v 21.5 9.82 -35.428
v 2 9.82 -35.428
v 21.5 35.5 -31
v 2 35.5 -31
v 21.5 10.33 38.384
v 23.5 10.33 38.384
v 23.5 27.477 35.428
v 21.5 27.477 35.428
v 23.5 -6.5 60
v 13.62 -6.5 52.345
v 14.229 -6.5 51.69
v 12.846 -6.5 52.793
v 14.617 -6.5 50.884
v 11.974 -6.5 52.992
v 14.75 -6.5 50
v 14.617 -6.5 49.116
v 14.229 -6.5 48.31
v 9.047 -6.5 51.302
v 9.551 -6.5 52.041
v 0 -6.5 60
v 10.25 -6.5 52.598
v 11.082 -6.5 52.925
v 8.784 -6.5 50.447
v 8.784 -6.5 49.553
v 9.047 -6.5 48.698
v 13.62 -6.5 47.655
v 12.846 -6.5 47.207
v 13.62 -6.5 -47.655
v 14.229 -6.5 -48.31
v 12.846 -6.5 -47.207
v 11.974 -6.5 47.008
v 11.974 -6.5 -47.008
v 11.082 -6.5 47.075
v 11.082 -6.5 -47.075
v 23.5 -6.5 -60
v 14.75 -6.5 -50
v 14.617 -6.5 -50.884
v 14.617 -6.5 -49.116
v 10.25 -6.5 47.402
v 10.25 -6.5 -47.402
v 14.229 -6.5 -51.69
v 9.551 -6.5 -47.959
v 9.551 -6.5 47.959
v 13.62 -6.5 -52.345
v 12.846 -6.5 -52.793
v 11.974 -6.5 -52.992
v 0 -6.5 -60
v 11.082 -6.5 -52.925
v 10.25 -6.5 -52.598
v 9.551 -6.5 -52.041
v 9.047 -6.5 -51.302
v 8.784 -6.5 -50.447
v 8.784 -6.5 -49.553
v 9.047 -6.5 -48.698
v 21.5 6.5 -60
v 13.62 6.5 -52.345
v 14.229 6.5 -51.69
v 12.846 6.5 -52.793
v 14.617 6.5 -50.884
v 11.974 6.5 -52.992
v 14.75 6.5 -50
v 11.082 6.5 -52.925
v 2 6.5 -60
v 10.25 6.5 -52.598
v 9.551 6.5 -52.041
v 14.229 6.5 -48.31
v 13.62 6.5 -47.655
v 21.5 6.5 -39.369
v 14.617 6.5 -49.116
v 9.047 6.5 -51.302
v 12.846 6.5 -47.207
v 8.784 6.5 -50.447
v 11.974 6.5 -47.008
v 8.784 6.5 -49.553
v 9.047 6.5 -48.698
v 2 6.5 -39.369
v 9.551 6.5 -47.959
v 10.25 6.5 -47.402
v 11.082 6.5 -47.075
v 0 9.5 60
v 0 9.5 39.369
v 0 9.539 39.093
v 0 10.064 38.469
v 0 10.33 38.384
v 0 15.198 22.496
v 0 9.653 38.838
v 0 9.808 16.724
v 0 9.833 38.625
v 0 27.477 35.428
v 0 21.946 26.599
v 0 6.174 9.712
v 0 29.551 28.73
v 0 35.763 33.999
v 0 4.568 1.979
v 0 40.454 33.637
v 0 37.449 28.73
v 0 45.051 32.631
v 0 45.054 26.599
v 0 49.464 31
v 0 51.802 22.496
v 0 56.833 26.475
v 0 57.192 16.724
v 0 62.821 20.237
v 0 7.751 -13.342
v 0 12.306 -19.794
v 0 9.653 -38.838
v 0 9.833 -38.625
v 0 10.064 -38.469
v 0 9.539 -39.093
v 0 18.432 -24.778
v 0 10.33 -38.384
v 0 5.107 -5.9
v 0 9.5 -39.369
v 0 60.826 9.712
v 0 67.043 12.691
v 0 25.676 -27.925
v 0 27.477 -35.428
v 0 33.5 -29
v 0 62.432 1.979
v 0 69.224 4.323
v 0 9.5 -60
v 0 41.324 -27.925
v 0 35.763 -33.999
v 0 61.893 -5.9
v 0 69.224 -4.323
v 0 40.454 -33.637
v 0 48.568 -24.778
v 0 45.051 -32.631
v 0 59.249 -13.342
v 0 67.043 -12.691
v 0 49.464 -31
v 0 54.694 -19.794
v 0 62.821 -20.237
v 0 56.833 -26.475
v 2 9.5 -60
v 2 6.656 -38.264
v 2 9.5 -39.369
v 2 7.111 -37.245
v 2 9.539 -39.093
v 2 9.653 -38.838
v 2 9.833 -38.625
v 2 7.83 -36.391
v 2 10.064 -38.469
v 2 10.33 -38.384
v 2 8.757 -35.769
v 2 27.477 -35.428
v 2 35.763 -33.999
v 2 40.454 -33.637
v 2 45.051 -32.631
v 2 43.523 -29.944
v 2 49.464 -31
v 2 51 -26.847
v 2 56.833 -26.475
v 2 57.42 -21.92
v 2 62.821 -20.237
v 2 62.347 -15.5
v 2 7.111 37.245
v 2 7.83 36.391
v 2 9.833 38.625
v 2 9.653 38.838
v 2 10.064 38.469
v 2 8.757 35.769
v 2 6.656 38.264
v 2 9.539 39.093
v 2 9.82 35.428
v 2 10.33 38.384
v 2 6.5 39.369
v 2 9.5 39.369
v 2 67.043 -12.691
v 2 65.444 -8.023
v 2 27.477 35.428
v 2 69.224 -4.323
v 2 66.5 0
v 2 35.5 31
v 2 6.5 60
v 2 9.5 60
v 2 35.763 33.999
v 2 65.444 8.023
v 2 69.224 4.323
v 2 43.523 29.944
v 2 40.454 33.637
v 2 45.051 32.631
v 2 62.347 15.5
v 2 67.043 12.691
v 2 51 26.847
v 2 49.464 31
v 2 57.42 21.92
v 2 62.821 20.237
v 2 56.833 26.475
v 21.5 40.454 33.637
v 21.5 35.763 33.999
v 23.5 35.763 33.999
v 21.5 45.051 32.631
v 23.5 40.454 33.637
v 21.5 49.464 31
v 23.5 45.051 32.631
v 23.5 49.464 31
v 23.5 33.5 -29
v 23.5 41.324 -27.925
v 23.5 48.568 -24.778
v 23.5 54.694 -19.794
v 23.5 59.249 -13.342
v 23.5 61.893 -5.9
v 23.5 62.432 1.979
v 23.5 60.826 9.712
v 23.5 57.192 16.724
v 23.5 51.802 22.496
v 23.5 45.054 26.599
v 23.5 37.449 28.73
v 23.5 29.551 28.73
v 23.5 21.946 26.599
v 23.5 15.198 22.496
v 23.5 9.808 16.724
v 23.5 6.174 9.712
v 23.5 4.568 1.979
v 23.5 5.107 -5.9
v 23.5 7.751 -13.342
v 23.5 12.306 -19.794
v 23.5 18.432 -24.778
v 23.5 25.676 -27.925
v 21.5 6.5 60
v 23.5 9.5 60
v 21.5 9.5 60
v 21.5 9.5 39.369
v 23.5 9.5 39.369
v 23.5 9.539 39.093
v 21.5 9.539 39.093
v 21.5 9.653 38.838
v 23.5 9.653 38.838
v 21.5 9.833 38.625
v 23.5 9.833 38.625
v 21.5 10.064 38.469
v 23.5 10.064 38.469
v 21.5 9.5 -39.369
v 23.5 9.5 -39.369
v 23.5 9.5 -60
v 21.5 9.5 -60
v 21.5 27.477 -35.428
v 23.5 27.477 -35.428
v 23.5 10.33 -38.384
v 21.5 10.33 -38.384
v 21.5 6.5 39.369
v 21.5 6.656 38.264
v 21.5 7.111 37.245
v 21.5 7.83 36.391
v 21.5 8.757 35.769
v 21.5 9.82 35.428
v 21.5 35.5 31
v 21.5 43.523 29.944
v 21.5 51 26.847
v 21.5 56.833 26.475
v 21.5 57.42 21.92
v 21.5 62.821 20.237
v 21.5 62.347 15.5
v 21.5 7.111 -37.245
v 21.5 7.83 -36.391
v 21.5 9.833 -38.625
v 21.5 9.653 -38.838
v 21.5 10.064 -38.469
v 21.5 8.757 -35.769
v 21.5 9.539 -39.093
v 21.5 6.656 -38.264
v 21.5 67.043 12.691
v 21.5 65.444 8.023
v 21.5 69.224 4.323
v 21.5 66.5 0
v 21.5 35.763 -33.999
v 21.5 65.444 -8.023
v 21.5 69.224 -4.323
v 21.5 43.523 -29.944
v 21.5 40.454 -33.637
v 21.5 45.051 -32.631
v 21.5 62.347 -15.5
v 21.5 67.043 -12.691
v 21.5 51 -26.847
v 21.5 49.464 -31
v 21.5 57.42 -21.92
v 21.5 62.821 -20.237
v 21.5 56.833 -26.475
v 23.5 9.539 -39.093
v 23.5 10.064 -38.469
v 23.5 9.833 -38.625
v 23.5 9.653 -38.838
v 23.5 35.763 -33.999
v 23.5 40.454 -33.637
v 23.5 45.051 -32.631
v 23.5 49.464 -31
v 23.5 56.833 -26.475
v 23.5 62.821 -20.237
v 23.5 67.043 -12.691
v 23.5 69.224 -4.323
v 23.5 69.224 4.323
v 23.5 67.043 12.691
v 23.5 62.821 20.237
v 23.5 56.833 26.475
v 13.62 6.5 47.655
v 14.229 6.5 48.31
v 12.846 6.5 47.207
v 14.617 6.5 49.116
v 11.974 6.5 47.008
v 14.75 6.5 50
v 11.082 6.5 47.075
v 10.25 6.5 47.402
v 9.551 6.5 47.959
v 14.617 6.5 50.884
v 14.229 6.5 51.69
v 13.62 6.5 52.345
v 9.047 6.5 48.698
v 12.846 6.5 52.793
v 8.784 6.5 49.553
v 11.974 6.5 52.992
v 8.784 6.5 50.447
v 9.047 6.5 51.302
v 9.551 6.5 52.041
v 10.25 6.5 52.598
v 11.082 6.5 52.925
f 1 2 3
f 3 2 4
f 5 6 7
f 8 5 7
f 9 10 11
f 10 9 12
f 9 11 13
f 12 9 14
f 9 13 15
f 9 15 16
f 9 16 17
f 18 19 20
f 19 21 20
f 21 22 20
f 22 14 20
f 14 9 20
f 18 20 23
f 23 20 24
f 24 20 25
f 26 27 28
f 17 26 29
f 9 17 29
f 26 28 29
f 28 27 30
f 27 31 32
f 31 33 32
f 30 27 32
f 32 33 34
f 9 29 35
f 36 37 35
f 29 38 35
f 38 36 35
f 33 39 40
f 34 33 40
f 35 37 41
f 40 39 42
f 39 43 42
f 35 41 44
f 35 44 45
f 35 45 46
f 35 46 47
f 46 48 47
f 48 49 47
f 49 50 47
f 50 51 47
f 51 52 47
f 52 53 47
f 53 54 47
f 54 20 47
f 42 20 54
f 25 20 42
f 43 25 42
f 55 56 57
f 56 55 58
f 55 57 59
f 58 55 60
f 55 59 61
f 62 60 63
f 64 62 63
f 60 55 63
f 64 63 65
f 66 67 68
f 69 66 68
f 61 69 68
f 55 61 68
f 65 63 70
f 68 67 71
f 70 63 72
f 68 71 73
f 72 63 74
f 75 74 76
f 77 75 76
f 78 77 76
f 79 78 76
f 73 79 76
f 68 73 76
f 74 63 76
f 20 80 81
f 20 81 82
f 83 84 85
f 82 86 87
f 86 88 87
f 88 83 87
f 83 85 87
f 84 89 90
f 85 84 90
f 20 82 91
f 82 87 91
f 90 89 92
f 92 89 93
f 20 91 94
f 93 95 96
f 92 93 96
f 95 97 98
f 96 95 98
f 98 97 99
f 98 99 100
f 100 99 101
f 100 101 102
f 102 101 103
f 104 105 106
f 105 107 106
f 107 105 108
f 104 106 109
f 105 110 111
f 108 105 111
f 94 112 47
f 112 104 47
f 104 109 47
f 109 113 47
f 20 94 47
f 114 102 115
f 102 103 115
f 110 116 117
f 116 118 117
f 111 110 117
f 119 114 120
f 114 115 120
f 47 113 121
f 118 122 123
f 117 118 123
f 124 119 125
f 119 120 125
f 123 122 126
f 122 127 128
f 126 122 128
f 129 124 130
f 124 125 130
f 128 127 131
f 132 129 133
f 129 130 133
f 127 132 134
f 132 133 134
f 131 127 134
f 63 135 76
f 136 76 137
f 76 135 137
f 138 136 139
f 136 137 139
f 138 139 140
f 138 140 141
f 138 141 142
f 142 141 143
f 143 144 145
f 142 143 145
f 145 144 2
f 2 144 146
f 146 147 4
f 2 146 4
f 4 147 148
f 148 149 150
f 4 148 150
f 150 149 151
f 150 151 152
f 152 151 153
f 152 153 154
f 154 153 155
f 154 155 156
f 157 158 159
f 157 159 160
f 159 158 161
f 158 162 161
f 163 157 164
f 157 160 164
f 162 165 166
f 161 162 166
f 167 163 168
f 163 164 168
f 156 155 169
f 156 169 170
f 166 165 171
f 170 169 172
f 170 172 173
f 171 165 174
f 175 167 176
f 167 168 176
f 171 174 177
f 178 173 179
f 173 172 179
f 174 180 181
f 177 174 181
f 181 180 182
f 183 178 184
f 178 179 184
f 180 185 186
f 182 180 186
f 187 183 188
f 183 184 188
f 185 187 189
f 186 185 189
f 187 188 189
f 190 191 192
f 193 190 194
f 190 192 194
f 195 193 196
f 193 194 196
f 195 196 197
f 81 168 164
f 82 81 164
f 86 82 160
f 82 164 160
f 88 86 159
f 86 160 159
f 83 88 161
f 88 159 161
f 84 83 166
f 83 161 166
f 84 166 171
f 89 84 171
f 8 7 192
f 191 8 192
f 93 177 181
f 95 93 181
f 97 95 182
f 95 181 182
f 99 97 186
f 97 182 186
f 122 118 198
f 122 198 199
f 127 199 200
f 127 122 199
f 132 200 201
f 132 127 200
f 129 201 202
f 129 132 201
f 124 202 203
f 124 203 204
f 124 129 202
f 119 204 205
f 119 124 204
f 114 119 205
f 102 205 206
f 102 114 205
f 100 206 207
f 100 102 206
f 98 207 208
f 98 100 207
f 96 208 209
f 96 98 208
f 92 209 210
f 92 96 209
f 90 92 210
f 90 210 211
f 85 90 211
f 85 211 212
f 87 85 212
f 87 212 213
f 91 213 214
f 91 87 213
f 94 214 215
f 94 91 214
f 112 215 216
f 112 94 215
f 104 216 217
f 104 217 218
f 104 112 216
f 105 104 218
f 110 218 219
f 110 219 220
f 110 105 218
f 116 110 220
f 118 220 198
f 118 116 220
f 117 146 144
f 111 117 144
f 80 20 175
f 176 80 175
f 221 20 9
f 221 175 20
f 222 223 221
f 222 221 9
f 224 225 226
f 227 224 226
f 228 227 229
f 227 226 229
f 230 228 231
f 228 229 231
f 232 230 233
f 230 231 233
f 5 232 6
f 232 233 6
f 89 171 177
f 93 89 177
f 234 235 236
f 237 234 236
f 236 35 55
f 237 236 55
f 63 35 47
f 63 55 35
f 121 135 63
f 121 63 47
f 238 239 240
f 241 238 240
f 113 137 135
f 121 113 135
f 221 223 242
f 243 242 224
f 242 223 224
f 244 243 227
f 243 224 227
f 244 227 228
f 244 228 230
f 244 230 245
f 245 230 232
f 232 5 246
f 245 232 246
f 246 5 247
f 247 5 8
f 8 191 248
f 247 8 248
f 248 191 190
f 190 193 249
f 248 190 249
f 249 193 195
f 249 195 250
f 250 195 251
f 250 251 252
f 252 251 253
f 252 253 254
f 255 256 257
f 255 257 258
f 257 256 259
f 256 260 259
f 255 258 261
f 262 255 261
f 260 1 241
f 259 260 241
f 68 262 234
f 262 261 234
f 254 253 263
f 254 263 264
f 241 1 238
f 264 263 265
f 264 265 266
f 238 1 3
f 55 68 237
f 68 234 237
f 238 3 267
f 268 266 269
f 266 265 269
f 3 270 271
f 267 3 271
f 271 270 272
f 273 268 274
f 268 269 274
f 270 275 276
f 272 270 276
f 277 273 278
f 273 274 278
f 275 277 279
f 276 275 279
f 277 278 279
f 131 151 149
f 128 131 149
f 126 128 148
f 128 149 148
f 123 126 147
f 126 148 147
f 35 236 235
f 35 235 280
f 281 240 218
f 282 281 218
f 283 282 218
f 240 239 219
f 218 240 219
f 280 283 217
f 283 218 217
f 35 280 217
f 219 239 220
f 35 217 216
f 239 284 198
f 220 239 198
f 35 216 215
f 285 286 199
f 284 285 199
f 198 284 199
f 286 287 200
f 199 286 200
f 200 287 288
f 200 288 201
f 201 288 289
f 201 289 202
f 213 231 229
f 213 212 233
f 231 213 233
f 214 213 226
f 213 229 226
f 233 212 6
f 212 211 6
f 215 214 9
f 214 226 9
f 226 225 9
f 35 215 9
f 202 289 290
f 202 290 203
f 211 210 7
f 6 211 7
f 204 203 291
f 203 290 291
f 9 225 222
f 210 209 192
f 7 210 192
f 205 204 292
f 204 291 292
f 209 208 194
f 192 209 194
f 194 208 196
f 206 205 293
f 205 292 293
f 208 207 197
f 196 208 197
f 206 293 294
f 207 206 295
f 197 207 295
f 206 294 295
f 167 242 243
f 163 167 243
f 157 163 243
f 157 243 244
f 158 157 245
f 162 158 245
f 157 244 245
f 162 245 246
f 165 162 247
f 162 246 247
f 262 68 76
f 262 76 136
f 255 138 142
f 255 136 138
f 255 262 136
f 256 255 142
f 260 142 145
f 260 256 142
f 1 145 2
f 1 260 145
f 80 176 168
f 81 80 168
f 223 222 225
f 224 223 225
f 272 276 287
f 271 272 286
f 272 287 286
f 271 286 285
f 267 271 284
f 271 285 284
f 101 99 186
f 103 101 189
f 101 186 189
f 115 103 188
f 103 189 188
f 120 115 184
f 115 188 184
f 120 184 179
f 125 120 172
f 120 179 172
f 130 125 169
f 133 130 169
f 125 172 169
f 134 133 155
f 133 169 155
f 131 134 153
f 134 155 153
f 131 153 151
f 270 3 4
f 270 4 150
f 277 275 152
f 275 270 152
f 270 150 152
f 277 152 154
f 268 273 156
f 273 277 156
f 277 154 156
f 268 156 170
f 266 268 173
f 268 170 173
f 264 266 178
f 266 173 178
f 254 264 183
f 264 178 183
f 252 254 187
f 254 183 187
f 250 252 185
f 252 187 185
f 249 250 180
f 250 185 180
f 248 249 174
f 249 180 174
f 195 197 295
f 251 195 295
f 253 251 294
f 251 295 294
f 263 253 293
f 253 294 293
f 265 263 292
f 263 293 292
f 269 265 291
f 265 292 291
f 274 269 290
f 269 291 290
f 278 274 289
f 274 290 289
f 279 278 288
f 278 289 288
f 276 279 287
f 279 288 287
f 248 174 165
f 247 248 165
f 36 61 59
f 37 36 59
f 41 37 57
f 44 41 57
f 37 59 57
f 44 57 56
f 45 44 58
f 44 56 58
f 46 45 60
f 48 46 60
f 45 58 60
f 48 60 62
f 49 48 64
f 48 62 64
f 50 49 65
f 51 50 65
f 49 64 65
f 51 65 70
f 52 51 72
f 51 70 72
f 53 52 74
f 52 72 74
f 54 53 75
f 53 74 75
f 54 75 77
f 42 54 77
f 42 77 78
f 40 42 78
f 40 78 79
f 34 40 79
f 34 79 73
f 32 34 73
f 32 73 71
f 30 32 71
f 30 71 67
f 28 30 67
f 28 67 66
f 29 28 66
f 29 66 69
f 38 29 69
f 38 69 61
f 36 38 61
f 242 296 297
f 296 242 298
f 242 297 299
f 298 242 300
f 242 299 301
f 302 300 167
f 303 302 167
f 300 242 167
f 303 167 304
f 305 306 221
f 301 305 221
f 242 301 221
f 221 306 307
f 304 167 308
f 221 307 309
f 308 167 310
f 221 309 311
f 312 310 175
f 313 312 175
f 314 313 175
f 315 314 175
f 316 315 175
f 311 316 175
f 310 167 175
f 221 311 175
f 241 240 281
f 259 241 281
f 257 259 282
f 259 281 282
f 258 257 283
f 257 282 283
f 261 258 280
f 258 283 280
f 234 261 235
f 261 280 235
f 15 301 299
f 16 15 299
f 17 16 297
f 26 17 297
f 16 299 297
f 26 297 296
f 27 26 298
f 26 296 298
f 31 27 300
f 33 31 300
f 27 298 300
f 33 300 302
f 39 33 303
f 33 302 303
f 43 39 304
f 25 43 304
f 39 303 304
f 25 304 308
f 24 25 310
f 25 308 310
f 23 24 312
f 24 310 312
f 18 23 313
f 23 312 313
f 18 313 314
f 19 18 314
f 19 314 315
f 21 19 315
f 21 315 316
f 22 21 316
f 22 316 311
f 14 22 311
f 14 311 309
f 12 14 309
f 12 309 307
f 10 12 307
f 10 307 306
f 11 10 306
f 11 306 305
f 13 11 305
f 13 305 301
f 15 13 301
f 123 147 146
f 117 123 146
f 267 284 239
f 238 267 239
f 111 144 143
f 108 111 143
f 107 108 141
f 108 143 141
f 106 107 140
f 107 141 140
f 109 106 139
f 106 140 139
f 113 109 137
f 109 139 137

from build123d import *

# Parameters (mm, degrees)
SZKIC2_R                    = 29
DODANIE_WYCI_GNI_CIE2_DEPTH = 23.5
SZKIC3_R                    = 3
WYTNIJ_WYCI_GNI_CIE1_DEPTH  = 23.5
ZAOKR_GLENIE1_R             = 4
DODANIE_WYCI_GNI_CIE3_REACH = 82
WYTNIJ_WYCI_GNI_CIE2_DEPTH  = 23.5


with BuildPart() as part:
    # Szkic2 → Dodanie-wyciągnięcie2 (new body)
    with BuildSketch(Plane(origin=(0, 0, 0), x_dir=(0, 0, -1), z_dir=(1, 0, 0))):
        with BuildLine():
            Line((-60, -6.5), (60, -6.5))
            Line((60, -6.5), (60, 6.5))
            Line((60, 6.5), (36, 6.5))
            Line((36, 6.5), (31, 35.5))
            ThreePointArc((31, 35.5), (0, 66.5), (-31, 35.5))
            Line((-31, 35.5), (-36, 6.5))
            Line((-36, 6.5), (-60, 6.5))
            Line((-60, 6.5), (-60, -6.5))
        make_face()
        with Locations((0, 33.5)):
            Circle(SZKIC2_R, mode=Mode.SUBTRACT)
    extrude(amount=DODANIE_WYCI_GNI_CIE2_DEPTH)

    # Szkic3 → Wytnij-wyciągnięcie1 (cut)
    with BuildSketch(Plane(origin=(0, 6.5, 0), x_dir=(1, 0, 0), z_dir=(0, 1, 0))):
        with Locations((11.75, 50)):
            Circle(SZKIC3_R)
        with Locations((11.75, -50)):
            Circle(SZKIC3_R)
    extrude(amount=-WYTNIJ_WYCI_GNI_CIE1_DEPTH, mode=Mode.SUBTRACT)

    # Zaokrąglenie1
    zaokr_glenie1_edges = [part.edges().sort_by_distance(p)[0] for p in [
        (11.75, 6.5, -36),
        (11.75, 6.5, 36),
    ]]
    fillet(zaokr_glenie1_edges, radius=ZAOKR_GLENIE1_R)

    # Szkic4 → Dodanie-wyciągnięcie3 (add, up to next)
    with BuildSketch(Plane(origin=(0, 73.5, 0), x_dir=(-1, 0, 0), z_dir=(0, -1, 0)), mode=Mode.PRIVATE) as dodanie_wyci_gni_cie3_sk1:
        Polygon((0, 60), (0, 39.369362474), (0, 35.427522011), (0, 31), (0, -31), (0, -35.427522011), (0, -39.369362474), (0, -60), (-2, -60), (-2, -58), (-2, 58), (-2, 60), align=None)
    dodanie_wyci_gni_cie3_tool1 = extrude(dodanie_wyci_gni_cie3_sk1.sketch, amount=DODANIE_WYCI_GNI_CIE3_REACH, mode=Mode.PRIVATE) - part.part
    add(dodanie_wyci_gni_cie3_tool1.solids().sort_by_distance((1, 73.5, 0))[0])
    # Szkic4 → Dodanie-wyciągnięcie3 (add, up to next)
    with BuildSketch(Plane(origin=(0, 73.5, 0), x_dir=(-1, 0, 0), z_dir=(0, -1, 0)), mode=Mode.PRIVATE) as dodanie_wyci_gni_cie3_sk2:
        Polygon((-23.5, 39.369362474), (-23.5, 60), (-21.5, 60), (-21.5, 58), (-21.5, -58), (-21.5, -60), (-23.5, -60), (-23.5, -39.369362474), (-23.5, -35.427522011), (-23.5, -31), (-23.5, 31), (-23.5, 35.427522011), align=None)
    dodanie_wyci_gni_cie3_tool2 = extrude(dodanie_wyci_gni_cie3_sk2.sketch, amount=DODANIE_WYCI_GNI_CIE3_REACH, mode=Mode.PRIVATE) - part.part
    add(dodanie_wyci_gni_cie3_tool2.solids().sort_by_distance((22.5, 73.5, 0))[0])

    # Szkic5 → Wytnij-wyciągnięcie2 (cut)
    with BuildSketch(Plane(origin=(23.5, 0, 0), x_dir=(0, 0, -1), z_dir=(1, 0, 0))):
        Polygon((-60, 73.5), (-60, 9.5), (-58, 9.5), (-39.369362474, 9.5), (-39.369362474, 73.5), align=None)
        with BuildLine():
            Line((-39.369362474, 73.5), (-39.369362474, 9.5))
            ThreePointArc((-39.369362474, 9.5), (-38.725121416, 9.735177499), (-38.383902359, 10.330093083))
            Line((-38.383902359, 10.330093083), (-35.427522011, 27.477099097))
            Line((-35.427522011, 27.477099097), (-35.427522011, 73.5))
            Line((-35.427522011, 73.5), (-39.369362474, 73.5))
        make_face()
        with BuildLine():
            Line((-31, 73.5), (-31, 49.464240044))
            ThreePointArc((-31, 49.464240044), (0, 69.5), (31, 49.464240044))
            Line((31, 49.464240044), (31, 73.5))
            Line((31, 73.5), (-31, 73.5))
        make_face()
        with BuildLine():
            Line((-35.427522011, 73.5), (-35.427522011, 27.477099097))
            Line((-35.427522011, 27.477099097), (-33.998985816, 35.762609032))
            ThreePointArc((-33.998985816, 35.762609032), (-33.213712716, 42.769751553), (-31, 49.464240044))
            Line((-31, 49.464240044), (-31, 73.5))
            Line((-31, 73.5), (-35.427522011, 73.5))
        make_face()
        with BuildLine():
            Line((35.427522011, 73.5), (35.427522011, 27.477099097))
            Line((35.427522011, 27.477099097), (38.383902359, 10.330093083))
            ThreePointArc((38.383902359, 10.330093083), (38.725121416, 9.735177499), (39.369362474, 9.5))
            Line((39.369362474, 9.5), (39.369362474, 73.5))
            Line((39.369362474, 73.5), (35.427522011, 73.5))
        make_face()
        with BuildLine():
            Line((31, 73.5), (31, 49.464240044))
            ThreePointArc((31, 49.464240044), (33.213712716, 42.769751553), (33.998985816, 35.762609032))
            Line((33.998985816, 35.762609032), (35.427522011, 27.477099097))
            Line((35.427522011, 27.477099097), (35.427522011, 73.5))
            Line((35.427522011, 73.5), (31, 73.5))
        make_face()
        Polygon((39.369362474, 73.5), (39.369362474, 9.5), (58, 9.5), (60, 9.5), (60, 73.5), align=None)
    extrude(amount=-WYTNIJ_WYCI_GNI_CIE2_DEPTH, mode=Mode.SUBTRACT)


solid = part.part
